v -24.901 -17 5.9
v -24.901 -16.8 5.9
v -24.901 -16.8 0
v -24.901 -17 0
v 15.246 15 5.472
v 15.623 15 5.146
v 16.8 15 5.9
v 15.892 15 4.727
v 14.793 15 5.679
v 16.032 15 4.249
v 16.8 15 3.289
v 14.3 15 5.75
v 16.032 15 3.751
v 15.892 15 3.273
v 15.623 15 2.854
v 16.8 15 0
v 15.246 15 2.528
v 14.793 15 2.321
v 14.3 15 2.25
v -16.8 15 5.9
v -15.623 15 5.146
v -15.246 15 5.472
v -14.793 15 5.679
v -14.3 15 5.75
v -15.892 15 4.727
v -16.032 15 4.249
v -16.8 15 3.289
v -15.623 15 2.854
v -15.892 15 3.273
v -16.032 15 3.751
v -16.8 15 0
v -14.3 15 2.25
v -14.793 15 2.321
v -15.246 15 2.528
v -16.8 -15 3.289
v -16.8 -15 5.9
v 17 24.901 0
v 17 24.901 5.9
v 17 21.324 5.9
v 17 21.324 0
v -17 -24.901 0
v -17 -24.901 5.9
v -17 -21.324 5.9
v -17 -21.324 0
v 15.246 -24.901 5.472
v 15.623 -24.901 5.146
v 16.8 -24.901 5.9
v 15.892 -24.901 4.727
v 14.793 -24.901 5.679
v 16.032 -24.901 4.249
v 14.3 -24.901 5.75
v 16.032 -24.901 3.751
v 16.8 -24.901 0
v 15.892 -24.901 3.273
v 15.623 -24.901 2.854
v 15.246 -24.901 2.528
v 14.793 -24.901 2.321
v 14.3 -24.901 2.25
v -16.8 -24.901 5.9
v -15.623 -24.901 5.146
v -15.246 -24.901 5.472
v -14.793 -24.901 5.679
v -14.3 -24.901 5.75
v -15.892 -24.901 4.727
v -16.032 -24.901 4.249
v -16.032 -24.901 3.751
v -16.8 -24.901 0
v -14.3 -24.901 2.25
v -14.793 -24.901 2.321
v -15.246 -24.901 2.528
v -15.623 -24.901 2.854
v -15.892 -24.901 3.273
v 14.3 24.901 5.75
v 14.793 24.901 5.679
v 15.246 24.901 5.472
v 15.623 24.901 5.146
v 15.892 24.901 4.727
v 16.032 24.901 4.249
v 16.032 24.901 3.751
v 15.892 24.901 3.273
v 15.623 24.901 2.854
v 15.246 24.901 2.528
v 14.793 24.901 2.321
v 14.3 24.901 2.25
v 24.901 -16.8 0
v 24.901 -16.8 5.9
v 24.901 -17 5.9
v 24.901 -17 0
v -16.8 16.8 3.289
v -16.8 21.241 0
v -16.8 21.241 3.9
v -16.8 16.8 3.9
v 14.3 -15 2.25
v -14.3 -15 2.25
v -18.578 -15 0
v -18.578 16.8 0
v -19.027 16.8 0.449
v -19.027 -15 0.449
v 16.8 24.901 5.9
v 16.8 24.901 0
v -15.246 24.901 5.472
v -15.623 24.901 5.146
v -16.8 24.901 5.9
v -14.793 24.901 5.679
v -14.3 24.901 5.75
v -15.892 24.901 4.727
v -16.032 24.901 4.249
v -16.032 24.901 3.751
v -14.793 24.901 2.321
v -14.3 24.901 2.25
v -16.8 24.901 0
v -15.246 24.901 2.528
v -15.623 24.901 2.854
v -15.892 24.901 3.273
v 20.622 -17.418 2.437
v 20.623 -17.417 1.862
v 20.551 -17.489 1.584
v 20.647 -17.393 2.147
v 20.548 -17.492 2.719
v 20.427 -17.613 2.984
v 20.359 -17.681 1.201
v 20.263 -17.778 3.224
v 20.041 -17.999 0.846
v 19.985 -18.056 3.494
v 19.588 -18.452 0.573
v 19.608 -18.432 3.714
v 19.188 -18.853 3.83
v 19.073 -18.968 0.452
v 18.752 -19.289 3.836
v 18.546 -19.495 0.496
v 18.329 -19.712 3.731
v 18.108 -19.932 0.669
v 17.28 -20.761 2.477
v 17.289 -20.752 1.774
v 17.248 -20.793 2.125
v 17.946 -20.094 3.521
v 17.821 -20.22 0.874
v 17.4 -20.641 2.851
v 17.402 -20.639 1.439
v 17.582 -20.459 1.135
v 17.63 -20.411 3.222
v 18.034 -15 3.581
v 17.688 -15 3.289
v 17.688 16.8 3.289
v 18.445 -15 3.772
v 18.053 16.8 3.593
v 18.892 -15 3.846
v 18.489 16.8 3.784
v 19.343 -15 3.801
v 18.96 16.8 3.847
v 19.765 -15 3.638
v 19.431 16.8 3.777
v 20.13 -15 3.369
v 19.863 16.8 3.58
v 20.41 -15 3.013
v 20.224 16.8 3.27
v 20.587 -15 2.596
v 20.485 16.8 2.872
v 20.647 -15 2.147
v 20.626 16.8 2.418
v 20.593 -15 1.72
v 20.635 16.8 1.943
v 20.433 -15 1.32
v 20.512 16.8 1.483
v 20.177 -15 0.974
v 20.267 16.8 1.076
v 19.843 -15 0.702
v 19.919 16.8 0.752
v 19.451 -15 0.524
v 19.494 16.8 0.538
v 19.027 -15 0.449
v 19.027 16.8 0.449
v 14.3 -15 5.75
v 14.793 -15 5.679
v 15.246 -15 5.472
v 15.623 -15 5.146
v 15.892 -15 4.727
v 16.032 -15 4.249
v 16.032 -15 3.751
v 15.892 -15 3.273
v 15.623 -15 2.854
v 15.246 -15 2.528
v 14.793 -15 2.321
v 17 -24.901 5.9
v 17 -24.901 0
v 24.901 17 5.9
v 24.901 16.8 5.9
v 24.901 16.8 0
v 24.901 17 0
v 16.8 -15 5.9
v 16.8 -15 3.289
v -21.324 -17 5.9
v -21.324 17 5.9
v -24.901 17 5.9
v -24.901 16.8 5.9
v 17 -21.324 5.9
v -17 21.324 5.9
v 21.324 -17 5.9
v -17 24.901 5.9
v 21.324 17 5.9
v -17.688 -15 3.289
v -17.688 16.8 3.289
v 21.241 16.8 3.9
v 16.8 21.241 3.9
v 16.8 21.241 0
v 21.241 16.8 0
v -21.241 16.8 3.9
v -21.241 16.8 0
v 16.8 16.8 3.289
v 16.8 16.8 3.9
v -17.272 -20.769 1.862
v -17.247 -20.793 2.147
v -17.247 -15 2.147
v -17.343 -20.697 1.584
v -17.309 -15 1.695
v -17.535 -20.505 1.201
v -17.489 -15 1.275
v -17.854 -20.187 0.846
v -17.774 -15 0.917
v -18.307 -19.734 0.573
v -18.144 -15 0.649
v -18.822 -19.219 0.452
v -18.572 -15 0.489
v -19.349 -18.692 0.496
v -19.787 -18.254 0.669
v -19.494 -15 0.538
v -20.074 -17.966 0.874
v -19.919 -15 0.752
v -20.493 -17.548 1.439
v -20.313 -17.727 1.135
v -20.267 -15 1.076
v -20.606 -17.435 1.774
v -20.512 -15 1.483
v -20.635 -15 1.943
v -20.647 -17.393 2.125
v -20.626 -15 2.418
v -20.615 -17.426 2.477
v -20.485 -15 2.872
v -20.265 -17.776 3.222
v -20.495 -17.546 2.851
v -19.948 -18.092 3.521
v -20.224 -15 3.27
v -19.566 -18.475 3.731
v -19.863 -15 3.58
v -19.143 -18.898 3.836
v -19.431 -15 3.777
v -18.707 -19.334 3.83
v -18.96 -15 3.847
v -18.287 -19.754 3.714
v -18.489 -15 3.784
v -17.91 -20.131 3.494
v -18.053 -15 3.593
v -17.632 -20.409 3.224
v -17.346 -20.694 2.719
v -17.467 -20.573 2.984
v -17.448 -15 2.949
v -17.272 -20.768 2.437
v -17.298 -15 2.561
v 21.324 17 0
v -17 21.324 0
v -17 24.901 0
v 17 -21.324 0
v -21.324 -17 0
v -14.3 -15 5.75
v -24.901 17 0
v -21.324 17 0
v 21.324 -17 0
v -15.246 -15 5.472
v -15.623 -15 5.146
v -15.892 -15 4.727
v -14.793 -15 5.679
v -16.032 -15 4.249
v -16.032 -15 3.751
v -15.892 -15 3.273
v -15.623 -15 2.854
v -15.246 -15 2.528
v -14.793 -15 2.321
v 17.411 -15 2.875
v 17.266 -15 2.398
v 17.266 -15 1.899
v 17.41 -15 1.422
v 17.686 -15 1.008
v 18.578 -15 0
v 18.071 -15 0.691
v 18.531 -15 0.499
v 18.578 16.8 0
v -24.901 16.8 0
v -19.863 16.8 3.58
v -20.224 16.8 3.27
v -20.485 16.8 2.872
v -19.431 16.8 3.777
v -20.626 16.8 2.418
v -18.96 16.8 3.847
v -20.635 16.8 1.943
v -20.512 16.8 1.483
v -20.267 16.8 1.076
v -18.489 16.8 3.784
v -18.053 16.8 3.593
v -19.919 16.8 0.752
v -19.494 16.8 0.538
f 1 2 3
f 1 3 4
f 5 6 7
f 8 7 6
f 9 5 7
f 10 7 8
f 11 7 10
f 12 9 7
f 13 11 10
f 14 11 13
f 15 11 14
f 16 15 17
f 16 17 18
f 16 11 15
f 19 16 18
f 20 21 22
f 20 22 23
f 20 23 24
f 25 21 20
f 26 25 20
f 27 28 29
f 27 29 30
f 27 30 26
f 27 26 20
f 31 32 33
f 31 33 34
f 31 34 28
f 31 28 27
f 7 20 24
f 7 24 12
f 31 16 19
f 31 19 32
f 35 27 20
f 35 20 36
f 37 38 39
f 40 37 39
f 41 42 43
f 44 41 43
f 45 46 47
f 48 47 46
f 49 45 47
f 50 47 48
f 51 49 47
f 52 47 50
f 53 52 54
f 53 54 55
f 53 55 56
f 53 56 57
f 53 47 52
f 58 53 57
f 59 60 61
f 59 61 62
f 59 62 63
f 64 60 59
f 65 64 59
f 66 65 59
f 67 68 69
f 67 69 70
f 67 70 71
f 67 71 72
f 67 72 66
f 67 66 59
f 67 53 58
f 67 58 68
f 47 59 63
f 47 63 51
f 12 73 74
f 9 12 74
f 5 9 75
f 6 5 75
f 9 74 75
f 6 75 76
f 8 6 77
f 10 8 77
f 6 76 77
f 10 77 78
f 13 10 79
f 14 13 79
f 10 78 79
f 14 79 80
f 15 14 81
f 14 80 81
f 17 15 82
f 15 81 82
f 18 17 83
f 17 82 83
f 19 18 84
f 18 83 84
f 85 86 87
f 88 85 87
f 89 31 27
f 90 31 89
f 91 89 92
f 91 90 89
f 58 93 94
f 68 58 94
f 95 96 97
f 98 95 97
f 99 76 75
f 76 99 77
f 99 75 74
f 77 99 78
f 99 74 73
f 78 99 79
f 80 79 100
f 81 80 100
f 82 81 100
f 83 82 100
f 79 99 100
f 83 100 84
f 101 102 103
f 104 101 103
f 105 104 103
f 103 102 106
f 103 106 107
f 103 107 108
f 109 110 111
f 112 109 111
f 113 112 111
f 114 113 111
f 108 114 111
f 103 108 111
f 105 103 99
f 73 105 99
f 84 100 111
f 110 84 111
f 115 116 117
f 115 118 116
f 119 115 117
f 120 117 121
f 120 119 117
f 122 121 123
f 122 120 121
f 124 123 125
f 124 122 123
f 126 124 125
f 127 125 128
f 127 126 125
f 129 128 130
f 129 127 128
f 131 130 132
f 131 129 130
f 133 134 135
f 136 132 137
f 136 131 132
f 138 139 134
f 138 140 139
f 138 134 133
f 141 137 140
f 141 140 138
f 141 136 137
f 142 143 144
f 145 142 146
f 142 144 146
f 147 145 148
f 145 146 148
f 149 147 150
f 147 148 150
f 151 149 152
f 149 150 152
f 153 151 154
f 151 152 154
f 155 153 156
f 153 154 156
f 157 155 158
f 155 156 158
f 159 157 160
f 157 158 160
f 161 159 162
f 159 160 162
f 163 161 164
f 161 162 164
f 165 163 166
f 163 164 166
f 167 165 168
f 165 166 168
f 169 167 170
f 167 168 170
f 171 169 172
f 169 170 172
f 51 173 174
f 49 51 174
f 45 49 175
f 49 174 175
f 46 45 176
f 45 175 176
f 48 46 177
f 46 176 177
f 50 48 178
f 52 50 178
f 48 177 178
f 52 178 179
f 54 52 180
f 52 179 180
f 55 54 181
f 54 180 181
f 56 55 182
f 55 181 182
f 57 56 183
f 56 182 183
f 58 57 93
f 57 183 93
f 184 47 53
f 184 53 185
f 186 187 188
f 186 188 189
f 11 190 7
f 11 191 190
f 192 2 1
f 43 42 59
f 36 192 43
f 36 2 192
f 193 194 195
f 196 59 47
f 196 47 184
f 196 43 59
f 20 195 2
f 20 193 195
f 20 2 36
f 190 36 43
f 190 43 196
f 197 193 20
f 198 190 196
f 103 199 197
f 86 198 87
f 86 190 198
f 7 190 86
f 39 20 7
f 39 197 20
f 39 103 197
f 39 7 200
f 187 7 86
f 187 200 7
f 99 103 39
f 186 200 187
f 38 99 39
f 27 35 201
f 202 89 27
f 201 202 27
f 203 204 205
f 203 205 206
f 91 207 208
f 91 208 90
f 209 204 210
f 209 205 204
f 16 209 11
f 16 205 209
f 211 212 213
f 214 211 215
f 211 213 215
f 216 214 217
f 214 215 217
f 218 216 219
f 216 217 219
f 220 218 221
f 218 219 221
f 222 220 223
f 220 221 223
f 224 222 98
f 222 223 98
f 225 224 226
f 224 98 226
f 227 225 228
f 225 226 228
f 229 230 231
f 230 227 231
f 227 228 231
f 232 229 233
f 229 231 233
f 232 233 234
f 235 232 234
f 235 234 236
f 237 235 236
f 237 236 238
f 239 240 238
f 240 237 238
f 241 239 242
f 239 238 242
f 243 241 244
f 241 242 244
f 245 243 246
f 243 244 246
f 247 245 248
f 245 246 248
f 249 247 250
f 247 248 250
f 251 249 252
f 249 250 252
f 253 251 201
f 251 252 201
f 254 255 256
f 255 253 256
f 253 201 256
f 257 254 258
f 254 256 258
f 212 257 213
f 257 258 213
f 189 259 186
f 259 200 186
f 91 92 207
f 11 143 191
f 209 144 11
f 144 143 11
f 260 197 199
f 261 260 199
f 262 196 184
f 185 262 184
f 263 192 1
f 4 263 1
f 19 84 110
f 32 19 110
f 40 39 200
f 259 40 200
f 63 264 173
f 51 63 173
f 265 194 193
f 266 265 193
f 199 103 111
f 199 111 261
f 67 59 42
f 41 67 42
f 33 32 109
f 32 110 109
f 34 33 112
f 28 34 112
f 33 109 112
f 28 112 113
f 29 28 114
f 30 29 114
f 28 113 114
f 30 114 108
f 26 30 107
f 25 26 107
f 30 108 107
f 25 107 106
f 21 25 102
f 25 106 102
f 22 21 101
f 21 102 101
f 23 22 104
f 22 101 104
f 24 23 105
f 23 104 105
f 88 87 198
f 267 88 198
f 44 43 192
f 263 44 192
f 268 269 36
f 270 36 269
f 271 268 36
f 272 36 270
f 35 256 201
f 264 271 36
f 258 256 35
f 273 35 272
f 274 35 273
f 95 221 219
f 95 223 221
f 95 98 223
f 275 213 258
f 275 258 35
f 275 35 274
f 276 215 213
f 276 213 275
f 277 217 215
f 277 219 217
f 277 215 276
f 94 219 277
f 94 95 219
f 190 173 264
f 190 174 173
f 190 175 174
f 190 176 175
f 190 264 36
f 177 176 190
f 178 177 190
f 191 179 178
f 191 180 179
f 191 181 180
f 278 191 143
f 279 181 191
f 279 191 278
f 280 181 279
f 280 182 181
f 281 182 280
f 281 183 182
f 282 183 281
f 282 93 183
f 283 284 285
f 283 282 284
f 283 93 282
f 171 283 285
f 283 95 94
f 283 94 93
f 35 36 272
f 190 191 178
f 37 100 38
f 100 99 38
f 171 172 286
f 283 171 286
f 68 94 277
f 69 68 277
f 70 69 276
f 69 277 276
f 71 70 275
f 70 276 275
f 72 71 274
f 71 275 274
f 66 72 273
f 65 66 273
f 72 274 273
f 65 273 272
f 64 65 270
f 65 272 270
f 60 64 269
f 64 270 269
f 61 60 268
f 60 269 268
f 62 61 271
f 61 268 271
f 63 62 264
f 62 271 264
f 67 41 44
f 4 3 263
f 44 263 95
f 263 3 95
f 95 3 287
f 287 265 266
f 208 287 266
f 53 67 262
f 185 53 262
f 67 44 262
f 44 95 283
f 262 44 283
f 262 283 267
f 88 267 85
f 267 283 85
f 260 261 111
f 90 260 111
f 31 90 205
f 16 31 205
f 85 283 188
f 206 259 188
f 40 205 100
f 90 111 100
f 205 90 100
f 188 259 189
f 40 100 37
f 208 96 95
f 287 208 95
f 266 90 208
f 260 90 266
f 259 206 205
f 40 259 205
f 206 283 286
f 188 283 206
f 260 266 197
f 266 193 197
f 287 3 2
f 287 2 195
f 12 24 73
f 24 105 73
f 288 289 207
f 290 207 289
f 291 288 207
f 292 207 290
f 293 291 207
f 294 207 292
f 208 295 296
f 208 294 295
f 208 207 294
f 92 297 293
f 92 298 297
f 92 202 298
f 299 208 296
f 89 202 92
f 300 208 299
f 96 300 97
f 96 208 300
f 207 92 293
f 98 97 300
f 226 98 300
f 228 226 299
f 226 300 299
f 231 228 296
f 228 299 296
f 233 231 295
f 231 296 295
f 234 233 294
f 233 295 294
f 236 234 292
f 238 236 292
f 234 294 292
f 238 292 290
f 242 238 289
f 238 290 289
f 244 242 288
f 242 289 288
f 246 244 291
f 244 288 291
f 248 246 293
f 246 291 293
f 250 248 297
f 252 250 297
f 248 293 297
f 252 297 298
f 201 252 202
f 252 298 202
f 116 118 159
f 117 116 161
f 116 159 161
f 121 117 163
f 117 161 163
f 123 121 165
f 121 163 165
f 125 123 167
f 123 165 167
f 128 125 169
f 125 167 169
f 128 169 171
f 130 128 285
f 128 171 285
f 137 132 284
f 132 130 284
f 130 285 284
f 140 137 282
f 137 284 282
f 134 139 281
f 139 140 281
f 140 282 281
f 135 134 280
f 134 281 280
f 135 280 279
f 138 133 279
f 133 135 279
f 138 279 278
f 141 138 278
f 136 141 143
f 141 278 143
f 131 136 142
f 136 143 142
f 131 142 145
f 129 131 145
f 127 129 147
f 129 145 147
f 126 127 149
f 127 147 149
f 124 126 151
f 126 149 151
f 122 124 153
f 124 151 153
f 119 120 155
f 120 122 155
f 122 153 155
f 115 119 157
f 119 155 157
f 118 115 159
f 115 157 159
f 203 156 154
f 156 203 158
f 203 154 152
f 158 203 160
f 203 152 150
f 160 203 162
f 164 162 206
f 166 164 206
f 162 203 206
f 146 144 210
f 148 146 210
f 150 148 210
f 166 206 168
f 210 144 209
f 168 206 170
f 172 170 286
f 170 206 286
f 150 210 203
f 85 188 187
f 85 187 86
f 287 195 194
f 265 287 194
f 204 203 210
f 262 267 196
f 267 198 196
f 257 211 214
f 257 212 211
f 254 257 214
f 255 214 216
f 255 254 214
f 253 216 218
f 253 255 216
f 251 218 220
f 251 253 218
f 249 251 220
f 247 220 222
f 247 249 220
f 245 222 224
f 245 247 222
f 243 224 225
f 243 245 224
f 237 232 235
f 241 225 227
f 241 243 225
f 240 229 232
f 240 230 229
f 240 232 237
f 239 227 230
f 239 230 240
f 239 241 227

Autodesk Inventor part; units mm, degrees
ref_plane "YZ Plane" through (0, 0, 0) normal (1, 0, 0) x (0, 1, 0)
ref_plane "XZ Plane" through (0, 0, 0) normal (0, 1, 0) x (-1, 0, 0)
ref_plane "XY Plane" through (0, 0, 0) normal (0, 0, 1) x (1, 0, 0)
sketch "Sketch1" plane through (0, 0, 0) normal (0, 0, 1) x (1, 0, 0)
  line L0 (-51.8104, 0) -> (51.8104, 0) construction
  line L1 (0, -35.1144) -> (0, 36.3819) construction
  line L2 (0, 0) -> (26.1682, 26.1682) construction
  line L3 (0, 0) -> (37.0074, 0) construction
  line L4 (16.8, 24.9006) -> (16.8, 21.2406)
  line L5 (16.8, 21.2406) -> (19.0203, 19.0203)
  line L6 (16.8, 24.9006) -> (0, 24.9006)
  line L7 (24.9006, 16.8) -> (21.2406, 16.8)
  line L8 (21.2406, 16.8) -> (19.0203, 19.0203)
  line L9 (24.9006, 16.8) -> (24.9006, 0)
  line L10 (0, 0) -> (-37.0074, 0) construction
  line L11 (-16.8, 24.9006) -> (-16.8, 21.2406)
  line L12 (-16.8, 21.2406) -> (-19.0203, 19.0203)
  line L13 (-16.8, 24.9006) -> (0, 24.9006)
  line L14 (-24.9006, 16.8) -> (-24.9006, 0)
  line L15 (-24.9006, 16.8) -> (-21.2406, 16.8)
  line L16 (-21.2406, 16.8) -> (-19.0203, 19.0203)
  line L17 (16.8, -24.9006) -> (16.8, -21.2406)
  line L18 (16.8, -21.2406) -> (19.0203, -19.0203)
  line L19 (16.8, -24.9006) -> (0, -24.9006)
  line L20 (24.9006, -16.8) -> (24.9006, 0)
  line L21 (24.9006, -16.8) -> (21.2406, -16.8)
  line L22 (21.2406, -16.8) -> (19.0203, -19.0203)
  line L23 (-16.8, -24.9006) -> (-16.8, -21.2406)
  line L24 (-16.8, -21.2406) -> (-19.0203, -19.0203)
  line L25 (-16.8, -24.9006) -> (0, -24.9006)
  line L26 (-24.9006, -16.8) -> (-24.9006, 0)
  line L27 (-24.9006, -16.8) -> (-21.2406, -16.8)
  line L28 (-21.2406, -16.8) -> (-19.0203, -19.0203)
  line L29 (-16.8, -16.8) -> (16.8, 16.8) construction
  line L30 (17.4242, -17.4242) -> (-16.0391, 16.0391) construction
  line L31 (-16.8, -15) -> (16.8, -15)
  line L32 (16.8, -15) -> (16.8, 15)
  line L33 (16.8, 15) -> (-16.8, 15)
  line L34 (-16.8, 15) -> (-16.8, -15)
  line L35 (-16.8, -15) -> (16.8, 15) construction
  line L36 (16.8, -15) -> (-16.8, 15) construction
  dimension "d0" = 45
  dimension "d1" = 3.14
  dimension "d2" = 3.66
  dimension "d4" = 16.8
  dimension "d16" = 33.6
  dimension "d17" = 30
extrude "Extrusion1" add sketch "Sketch1" along normal blind 8
sketch "Sketch2" plane through (-16.8, 24.9006, 0) normal (0, 1, 0) x (1, 0, 0)
  line L0 (-8.1006, 0) -> (-4.4406, 0) construction
  line L1 (-8.1006, 0) -> (-8.1006, -8) construction
  line L2 (-4.4406, -8) -> (-8.1006, -8) construction
  line L3 (-4.4406, 0) -> (-4.4406, -8) construction
  line L4 (-4.4406, 0) -> (0, 0) construction
  line L5 (-4.4406, 0) -> (-4.4406, -8) construction
  line L6 (0, -8) -> (-4.4406, -8) construction
  line L7 (0, 0) -> (0, -8) construction
  line L8 (0, 0) -> (33.6, 0) construction
  line L9 (0, 0) -> (0, -8) construction
  line L10 (33.6, -8) -> (0, -8) construction
  line L11 (33.6, 0) -> (33.6, -8) construction
  line L12 (33.6, 0) -> (38.0406, 0) construction
  line L13 (33.6, 0) -> (33.6, -8) construction
  line L14 (38.0406, -8) -> (33.6, -8) construction
  line L15 (38.0406, 0) -> (38.0406, -8) construction
  line L16 (38.0406, 0) -> (41.7006, 0) construction
  line L17 (38.0406, 0) -> (38.0406, -8) construction
  line L18 (41.7006, -8) -> (38.0406, -8) construction
  line L19 (41.7006, 0) -> (41.7006, -8) construction
  line L20 (-0.9933, -0.6346) -> (2.8461, 5.7642) construction
  ellipse E0 centre (4.1754, 7.1215) end of major axis (2.3333, 6.6563) minor radius 1.8997 (5.4585, 5.7204) -> (2.8461, 5.7642) ccw construction
  line L21 (5.4585, 5.7204) -> (9.3415, -1.2728) construction
  line L22 (9.3415, -1.2728) -> (8.4179, -1.2574) construction
  line L23 (8.4179, -1.2574) -> (4.8304, 5.2036) construction
  ellipse E1 centre (5.2675, 5.4463) end of major axis (4.7828, 5.3239) minor radius 0.4999 (4.9945, 5.8651) -> (4.8304, 5.2036) ccw construction
  ellipse E2 centre (4.1754, 7.1215) end of major axis (2.7211, 6.7542) minor radius 1.4998 (4.9945, 5.8651) -> (3.3146, 5.8932) ccw construction
  ellipse E3 centre (3.0277, 5.4838) end of major axis (3.5125, 5.6062) minor radius 0.4999 (3.4564, 5.2266) -> (3.3146, 5.8932) ccw construction
  line L24 (3.4564, 5.2266) -> (-0.3461, -1.1107) construction
  ellipse E4 centre (-1.5262, -2.0366) end of major axis (-0.0719, -1.6693) minor radius 1.4998 (-0.9933, -0.6346) -> (-0.3461, -1.1107) ccw construction
  circle A0 centre (-2.1474, -2.1474) radius 1.7
  line L25 (-4.4406, 0) -> (0, 0) construction
  line L26 (0, 0) -> (-3.5302, -3.5302) construction
  line L27 (0, 0) -> (4.9925, 0) construction
  line L28 (0, 0) -> (2, 0)
  line L29 (0, 0) -> (-1.7777, 0)
  line L30 (-1.7777, 0) -> (-2.227, -0.4493)
  line L31 (0, 0) -> (0, -3.2892)
  line L32 (0, -3.2892) -> (-0.8879, -3.2892)
  point P0 (16.8, 0)
  dimension "d8" = 3.4
  dimension "d9" = 135
extrude "Extrusion2" cut sketch "Sketch2" against normal up to surface (39.9006 mm away)
sketch "Sketch3" plane through (0, 0, 0) normal (0, 0, -1) x (-1, 0, 0)
  line L0 (16.8, 15) -> (16.8, 24.9006) construction
  line L1 (16.8, 24.9006) -> (-16.8, 24.9006) construction
  line L2 (-16.8, 24.9006) -> (-16.8, 21.2406) construction
  line L3 (-16.8, 21.2406) -> (-21.2406, 16.8) construction
  line L4 (-21.2406, 16.8) -> (-24.9006, 16.8) construction
  line L5 (-24.9006, 16.8) -> (-24.9006, -16.8) construction
  line L6 (-24.9006, -16.8) -> (-21.2406, -16.8) construction
  line L7 (-21.2406, -16.8) -> (-16.8, -21.2406) construction
  line L8 (-16.8, -21.2406) -> (-16.8, -24.9006) construction
  line L9 (-16.8, -24.9006) -> (16.8, -24.9006) construction
  line L10 (16.8, -24.9006) -> (16.8, -21.2406) construction
  line L11 (16.8, -21.2406) -> (21.2406, -16.8) construction
  line L12 (21.2406, -16.8) -> (24.9006, -16.8) construction
  line L13 (24.9006, -16.8) -> (24.9006, 16.8) construction
  line L14 (24.9006, 16.8) -> (21.2406, 16.8) construction
  line L15 (21.2406, 16.8) -> (18.5777, 19.4629) construction
  line L16 (21.2406, 16.8) -> (24.9006, 16.8) construction
  line L17 (24.9006, 16.8) -> (21.2406, 16.8) projected
  line L18 (18.5777, 19.4629) -> (18.5777, -15) projected
  line L19 (16.8, 21.2406) -> (21.2406, 16.8) projected
  line L20 (21.2406, 16.8) -> (16.8, 21.2406)
  line L21 (16.8, 21.2406) -> (16.8, 16.8)
  line L22 (16.8, 16.8) -> (21.2406, 16.8)
  line L23 (18.5777, 19.4629) -> (18.5777, -15) projected
  line L24 (18.5777, -15) -> (-16.8, -15) projected
  line L25 (-16.8, -15) -> (-16.8, 15) projected
  line L26 (-16.8, 15) -> (16.8, 15) projected
  point P0 (0, 0)
  point P1 (18.5777, -16.8)
extrude "Extrusion3" cut sketch "Sketch3" against normal blind 3.9
mirror "Mirror1" about plane through (0, 0, 0) normal (1, 0, 0) of "Extrusion3", "Extrusion2"
sketch "Sketch4" plane through (-16.8, -15, 8) normal (0, 1, 0) x (1, 0, 0)
  line L0 (-1.7777, 8) -> (35.3777, 8) construction
  line L1 (-1.7777, 8) -> (-2.227, 7.5507) construction
  arc A0 (-2.227, 7.5507) -> (-0.8879, 4.7108) centre (-2.1474, 5.8526) ccw construction
  line L2 (-0.8879, 4.7108) -> (0, 4.7108) construction
  line L3 (0, 4.7108) -> (0, 0) construction
  line L4 (33.6, 0) -> (0, 0) construction
  line L5 (33.6, 4.7108) -> (33.6, 0) construction
  line L6 (34.4879, 4.7108) -> (33.6, 4.7108) construction
  arc A1 (34.4879, 4.7108) -> (35.827, 7.5507) centre (35.7474, 5.8526) ccw construction
  line L7 (35.3777, 8) -> (35.827, 7.5507) construction
  circle A2 centre (35.7474, 5.8526) radius 1.7
  circle A3 centre (-2.1474, 5.8526) radius 1.7
  point P0 (16.8, 8)
extrude "Extrusion4" cut sketch "Sketch4" against normal blind 10
sketch "Sketch5" plane through (-16.8, 24.9006, 0) normal (0, 1, 0) x (1, 0, 0)
  line L0 (0, 0) -> (33.6, 0) construction
  line L1 (0, 0) -> (0, -8) construction
  line L2 (33.6, -8) -> (0, -8) construction
  line L3 (33.6, 0) -> (33.6, -8) construction
  line L4 (16.8, 0) -> (16.8, -8) construction
  line L5 (33.6, 0) -> (33.6, -8) construction
  line L6 (0, 0) -> (0, -8) construction
  line L7 (33.6, -4) -> (0, -4) construction
  line L8 (2.5, -4) -> (31.1, -4) construction
  line L9 (2.5, -5.75) -> (31.1, -5.75)
  line L10 (31.1, -2.25) -> (2.5, -2.25)
  arc A0 (2.5, -2.25) -> (2.5, -5.75) centre (2.5, -4) ccw
  arc A1 (31.1, -5.75) -> (31.1, -2.25) centre (31.1, -4) ccw
  point P0 (16.8, -4)
  dimension "d20" = 3.5
  dimension "d21" = 2.5
extrude "Extrusion5" cut sketch "Sketch5" against normal through all
sketch "Sketch6" plane through (0, 0, 8) normal (0, 0, 1) x (1, 0, 0)
  line L0 (-16.8, -15) -> (-16.8, 15) projected
  line L1 (-16.8, 15) -> (16.8, 15) projected
  line L2 (16.8, 15) -> (16.8, -15) projected
  line L3 (16.8, -15) -> (-16.8, -15) projected
  line L4 (16.8, 21.2406) -> (16.8, 24.9006) projected
  line L5 (16.8, 24.9006) -> (-16.8, 24.9006) projected
  line L6 (-16.8, 24.9006) -> (-16.8, 21.2406) projected
  line L7 (-16.8, 21.2406) -> (-21.2406, 16.8) projected
  line L8 (-21.2406, 16.8) -> (-24.9006, 16.8) projected
  line L9 (-24.9006, 16.8) -> (-24.9006, -16.8) projected
  line L10 (-24.9006, -16.8) -> (-21.2406, -16.8) projected
  line L11 (-21.2406, -16.8) -> (-16.8, -21.2406) projected
  line L12 (-16.8, -21.2406) -> (-16.8, -24.9006) projected
  line L13 (-16.8, -24.9006) -> (16.8, -24.9006) projected
  line L14 (16.8, -24.9006) -> (16.8, -21.2406) projected
  line L15 (16.8, -21.2406) -> (21.2406, -16.8) projected
  line L16 (21.2406, -16.8) -> (24.9006, -16.8) projected
  line L17 (24.9006, -16.8) -> (24.9006, 16.8) projected
  line L18 (24.9006, 16.8) -> (21.2406, 16.8) projected
  line L19 (21.2406, 16.8) -> (16.8, 21.2406) projected
  point P0 (0, 0)
extrude "Extrusion6" cut sketch "Sketch6" against normal blind 2.1
sketch "Skizze7" plane through (0, 0, 5.9) normal (0, 0, 1) x (1, 0, 0)
  line L0 (-16.8, -15) -> (16.8, -15) construction
  line L1 (-16.8, 15) -> (-16.8, -15) construction
  line L2 (16.8, 15) -> (-16.8, 15) construction
  line L3 (16.8, -15) -> (16.8, 15) construction
  line L4 (16.8, 24.9006) -> (16.8, 21.2406) projected
  line L5 (-16.8, 24.9006) -> (16.8, 24.9006) construction
  line L6 (-16.8, 21.2406) -> (-16.8, 24.9006) projected
  line L7 (-21.2406, 16.8) -> (-16.8, 21.2406) projected
  line L8 (-24.9006, 16.8) -> (-21.2406, 16.8) projected
  line L9 (-24.9006, -16.8) -> (-24.9006, 16.8) construction
  line L10 (-21.2406, -16.8) -> (-24.9006, -16.8) projected
  line L11 (-16.8, -21.2406) -> (-21.2406, -16.8) projected
  line L12 (-16.8, -24.9006) -> (-16.8, -21.2406) projected
  line L13 (16.8, -24.9006) -> (-16.8, -24.9006) construction
  line L14 (16.8, -21.2406) -> (16.8, -24.9006) projected
  line L15 (21.2406, -16.8) -> (16.8, -21.2406) projected
  line L16 (24.9006, -16.8) -> (21.2406, -16.8) projected
  line L17 (24.9006, 16.8) -> (24.9006, -16.8) construction
  line L18 (21.2406, 16.8) -> (24.9006, 16.8) projected
  line L19 (16.8, 21.2406) -> (21.2406, 16.8) projected
  line L20 (17, 25.1006) -> (17, 21.3235)
  line L21 (17, 21.3235) -> (21.3235, 17)
  line L22 (21.3235, 17) -> (25.1006, 17)
  line L23 (25.1006, 17) -> (25.1006, -17) construction
  line L24 (25.1006, -17) -> (21.3235, -17)
  line L25 (21.3235, -17) -> (17, -21.3235)
  line L26 (17, -21.3235) -> (17, -25.1006)
  line L27 (17, -25.1006) -> (-17, -25.1006) construction
  line L28 (-17, -25.1006) -> (-17, -21.3235)
  line L29 (-17, -21.3235) -> (-21.3235, -17)
  line L30 (-21.3235, -17) -> (-25.1006, -17)
  line L31 (-25.1006, -17) -> (-25.1006, 17) construction
  line L32 (-25.1006, 17) -> (-21.3235, 17)
  line L33 (-21.3235, 17) -> (-17, 21.3235)
  line L34 (-17, 21.3235) -> (-17, 25.1006)
  line L35 (-17, 25.1006) -> (17, 25.1006) construction
  line L36 (-24.9006, 16.8) -> (-24.9006, 17)
  line L37 (-16.8, 24.9006) -> (-17, 24.9006)
  line L38 (16.8, 24.9006) -> (17, 24.9006)
  line L39 (24.9006, 16.8) -> (24.9006, 17)
  line L40 (24.9006, -16.8) -> (24.9006, -17)
  line L41 (16.8, -24.9006) -> (17, -24.9006)
  line L42 (-16.8, -24.9006) -> (-17, -24.9006)
  line L43 (-24.9006, -16.8) -> (-24.9006, -17)
  point P0 (0, 0)
  dimension "d26" = 0.2
extrude "IM_offset" add sketch "Skizze7" against normal up to surface (5.9 mm away)
properties part number "20_Rect_Aperture_Insert_half_v3"
